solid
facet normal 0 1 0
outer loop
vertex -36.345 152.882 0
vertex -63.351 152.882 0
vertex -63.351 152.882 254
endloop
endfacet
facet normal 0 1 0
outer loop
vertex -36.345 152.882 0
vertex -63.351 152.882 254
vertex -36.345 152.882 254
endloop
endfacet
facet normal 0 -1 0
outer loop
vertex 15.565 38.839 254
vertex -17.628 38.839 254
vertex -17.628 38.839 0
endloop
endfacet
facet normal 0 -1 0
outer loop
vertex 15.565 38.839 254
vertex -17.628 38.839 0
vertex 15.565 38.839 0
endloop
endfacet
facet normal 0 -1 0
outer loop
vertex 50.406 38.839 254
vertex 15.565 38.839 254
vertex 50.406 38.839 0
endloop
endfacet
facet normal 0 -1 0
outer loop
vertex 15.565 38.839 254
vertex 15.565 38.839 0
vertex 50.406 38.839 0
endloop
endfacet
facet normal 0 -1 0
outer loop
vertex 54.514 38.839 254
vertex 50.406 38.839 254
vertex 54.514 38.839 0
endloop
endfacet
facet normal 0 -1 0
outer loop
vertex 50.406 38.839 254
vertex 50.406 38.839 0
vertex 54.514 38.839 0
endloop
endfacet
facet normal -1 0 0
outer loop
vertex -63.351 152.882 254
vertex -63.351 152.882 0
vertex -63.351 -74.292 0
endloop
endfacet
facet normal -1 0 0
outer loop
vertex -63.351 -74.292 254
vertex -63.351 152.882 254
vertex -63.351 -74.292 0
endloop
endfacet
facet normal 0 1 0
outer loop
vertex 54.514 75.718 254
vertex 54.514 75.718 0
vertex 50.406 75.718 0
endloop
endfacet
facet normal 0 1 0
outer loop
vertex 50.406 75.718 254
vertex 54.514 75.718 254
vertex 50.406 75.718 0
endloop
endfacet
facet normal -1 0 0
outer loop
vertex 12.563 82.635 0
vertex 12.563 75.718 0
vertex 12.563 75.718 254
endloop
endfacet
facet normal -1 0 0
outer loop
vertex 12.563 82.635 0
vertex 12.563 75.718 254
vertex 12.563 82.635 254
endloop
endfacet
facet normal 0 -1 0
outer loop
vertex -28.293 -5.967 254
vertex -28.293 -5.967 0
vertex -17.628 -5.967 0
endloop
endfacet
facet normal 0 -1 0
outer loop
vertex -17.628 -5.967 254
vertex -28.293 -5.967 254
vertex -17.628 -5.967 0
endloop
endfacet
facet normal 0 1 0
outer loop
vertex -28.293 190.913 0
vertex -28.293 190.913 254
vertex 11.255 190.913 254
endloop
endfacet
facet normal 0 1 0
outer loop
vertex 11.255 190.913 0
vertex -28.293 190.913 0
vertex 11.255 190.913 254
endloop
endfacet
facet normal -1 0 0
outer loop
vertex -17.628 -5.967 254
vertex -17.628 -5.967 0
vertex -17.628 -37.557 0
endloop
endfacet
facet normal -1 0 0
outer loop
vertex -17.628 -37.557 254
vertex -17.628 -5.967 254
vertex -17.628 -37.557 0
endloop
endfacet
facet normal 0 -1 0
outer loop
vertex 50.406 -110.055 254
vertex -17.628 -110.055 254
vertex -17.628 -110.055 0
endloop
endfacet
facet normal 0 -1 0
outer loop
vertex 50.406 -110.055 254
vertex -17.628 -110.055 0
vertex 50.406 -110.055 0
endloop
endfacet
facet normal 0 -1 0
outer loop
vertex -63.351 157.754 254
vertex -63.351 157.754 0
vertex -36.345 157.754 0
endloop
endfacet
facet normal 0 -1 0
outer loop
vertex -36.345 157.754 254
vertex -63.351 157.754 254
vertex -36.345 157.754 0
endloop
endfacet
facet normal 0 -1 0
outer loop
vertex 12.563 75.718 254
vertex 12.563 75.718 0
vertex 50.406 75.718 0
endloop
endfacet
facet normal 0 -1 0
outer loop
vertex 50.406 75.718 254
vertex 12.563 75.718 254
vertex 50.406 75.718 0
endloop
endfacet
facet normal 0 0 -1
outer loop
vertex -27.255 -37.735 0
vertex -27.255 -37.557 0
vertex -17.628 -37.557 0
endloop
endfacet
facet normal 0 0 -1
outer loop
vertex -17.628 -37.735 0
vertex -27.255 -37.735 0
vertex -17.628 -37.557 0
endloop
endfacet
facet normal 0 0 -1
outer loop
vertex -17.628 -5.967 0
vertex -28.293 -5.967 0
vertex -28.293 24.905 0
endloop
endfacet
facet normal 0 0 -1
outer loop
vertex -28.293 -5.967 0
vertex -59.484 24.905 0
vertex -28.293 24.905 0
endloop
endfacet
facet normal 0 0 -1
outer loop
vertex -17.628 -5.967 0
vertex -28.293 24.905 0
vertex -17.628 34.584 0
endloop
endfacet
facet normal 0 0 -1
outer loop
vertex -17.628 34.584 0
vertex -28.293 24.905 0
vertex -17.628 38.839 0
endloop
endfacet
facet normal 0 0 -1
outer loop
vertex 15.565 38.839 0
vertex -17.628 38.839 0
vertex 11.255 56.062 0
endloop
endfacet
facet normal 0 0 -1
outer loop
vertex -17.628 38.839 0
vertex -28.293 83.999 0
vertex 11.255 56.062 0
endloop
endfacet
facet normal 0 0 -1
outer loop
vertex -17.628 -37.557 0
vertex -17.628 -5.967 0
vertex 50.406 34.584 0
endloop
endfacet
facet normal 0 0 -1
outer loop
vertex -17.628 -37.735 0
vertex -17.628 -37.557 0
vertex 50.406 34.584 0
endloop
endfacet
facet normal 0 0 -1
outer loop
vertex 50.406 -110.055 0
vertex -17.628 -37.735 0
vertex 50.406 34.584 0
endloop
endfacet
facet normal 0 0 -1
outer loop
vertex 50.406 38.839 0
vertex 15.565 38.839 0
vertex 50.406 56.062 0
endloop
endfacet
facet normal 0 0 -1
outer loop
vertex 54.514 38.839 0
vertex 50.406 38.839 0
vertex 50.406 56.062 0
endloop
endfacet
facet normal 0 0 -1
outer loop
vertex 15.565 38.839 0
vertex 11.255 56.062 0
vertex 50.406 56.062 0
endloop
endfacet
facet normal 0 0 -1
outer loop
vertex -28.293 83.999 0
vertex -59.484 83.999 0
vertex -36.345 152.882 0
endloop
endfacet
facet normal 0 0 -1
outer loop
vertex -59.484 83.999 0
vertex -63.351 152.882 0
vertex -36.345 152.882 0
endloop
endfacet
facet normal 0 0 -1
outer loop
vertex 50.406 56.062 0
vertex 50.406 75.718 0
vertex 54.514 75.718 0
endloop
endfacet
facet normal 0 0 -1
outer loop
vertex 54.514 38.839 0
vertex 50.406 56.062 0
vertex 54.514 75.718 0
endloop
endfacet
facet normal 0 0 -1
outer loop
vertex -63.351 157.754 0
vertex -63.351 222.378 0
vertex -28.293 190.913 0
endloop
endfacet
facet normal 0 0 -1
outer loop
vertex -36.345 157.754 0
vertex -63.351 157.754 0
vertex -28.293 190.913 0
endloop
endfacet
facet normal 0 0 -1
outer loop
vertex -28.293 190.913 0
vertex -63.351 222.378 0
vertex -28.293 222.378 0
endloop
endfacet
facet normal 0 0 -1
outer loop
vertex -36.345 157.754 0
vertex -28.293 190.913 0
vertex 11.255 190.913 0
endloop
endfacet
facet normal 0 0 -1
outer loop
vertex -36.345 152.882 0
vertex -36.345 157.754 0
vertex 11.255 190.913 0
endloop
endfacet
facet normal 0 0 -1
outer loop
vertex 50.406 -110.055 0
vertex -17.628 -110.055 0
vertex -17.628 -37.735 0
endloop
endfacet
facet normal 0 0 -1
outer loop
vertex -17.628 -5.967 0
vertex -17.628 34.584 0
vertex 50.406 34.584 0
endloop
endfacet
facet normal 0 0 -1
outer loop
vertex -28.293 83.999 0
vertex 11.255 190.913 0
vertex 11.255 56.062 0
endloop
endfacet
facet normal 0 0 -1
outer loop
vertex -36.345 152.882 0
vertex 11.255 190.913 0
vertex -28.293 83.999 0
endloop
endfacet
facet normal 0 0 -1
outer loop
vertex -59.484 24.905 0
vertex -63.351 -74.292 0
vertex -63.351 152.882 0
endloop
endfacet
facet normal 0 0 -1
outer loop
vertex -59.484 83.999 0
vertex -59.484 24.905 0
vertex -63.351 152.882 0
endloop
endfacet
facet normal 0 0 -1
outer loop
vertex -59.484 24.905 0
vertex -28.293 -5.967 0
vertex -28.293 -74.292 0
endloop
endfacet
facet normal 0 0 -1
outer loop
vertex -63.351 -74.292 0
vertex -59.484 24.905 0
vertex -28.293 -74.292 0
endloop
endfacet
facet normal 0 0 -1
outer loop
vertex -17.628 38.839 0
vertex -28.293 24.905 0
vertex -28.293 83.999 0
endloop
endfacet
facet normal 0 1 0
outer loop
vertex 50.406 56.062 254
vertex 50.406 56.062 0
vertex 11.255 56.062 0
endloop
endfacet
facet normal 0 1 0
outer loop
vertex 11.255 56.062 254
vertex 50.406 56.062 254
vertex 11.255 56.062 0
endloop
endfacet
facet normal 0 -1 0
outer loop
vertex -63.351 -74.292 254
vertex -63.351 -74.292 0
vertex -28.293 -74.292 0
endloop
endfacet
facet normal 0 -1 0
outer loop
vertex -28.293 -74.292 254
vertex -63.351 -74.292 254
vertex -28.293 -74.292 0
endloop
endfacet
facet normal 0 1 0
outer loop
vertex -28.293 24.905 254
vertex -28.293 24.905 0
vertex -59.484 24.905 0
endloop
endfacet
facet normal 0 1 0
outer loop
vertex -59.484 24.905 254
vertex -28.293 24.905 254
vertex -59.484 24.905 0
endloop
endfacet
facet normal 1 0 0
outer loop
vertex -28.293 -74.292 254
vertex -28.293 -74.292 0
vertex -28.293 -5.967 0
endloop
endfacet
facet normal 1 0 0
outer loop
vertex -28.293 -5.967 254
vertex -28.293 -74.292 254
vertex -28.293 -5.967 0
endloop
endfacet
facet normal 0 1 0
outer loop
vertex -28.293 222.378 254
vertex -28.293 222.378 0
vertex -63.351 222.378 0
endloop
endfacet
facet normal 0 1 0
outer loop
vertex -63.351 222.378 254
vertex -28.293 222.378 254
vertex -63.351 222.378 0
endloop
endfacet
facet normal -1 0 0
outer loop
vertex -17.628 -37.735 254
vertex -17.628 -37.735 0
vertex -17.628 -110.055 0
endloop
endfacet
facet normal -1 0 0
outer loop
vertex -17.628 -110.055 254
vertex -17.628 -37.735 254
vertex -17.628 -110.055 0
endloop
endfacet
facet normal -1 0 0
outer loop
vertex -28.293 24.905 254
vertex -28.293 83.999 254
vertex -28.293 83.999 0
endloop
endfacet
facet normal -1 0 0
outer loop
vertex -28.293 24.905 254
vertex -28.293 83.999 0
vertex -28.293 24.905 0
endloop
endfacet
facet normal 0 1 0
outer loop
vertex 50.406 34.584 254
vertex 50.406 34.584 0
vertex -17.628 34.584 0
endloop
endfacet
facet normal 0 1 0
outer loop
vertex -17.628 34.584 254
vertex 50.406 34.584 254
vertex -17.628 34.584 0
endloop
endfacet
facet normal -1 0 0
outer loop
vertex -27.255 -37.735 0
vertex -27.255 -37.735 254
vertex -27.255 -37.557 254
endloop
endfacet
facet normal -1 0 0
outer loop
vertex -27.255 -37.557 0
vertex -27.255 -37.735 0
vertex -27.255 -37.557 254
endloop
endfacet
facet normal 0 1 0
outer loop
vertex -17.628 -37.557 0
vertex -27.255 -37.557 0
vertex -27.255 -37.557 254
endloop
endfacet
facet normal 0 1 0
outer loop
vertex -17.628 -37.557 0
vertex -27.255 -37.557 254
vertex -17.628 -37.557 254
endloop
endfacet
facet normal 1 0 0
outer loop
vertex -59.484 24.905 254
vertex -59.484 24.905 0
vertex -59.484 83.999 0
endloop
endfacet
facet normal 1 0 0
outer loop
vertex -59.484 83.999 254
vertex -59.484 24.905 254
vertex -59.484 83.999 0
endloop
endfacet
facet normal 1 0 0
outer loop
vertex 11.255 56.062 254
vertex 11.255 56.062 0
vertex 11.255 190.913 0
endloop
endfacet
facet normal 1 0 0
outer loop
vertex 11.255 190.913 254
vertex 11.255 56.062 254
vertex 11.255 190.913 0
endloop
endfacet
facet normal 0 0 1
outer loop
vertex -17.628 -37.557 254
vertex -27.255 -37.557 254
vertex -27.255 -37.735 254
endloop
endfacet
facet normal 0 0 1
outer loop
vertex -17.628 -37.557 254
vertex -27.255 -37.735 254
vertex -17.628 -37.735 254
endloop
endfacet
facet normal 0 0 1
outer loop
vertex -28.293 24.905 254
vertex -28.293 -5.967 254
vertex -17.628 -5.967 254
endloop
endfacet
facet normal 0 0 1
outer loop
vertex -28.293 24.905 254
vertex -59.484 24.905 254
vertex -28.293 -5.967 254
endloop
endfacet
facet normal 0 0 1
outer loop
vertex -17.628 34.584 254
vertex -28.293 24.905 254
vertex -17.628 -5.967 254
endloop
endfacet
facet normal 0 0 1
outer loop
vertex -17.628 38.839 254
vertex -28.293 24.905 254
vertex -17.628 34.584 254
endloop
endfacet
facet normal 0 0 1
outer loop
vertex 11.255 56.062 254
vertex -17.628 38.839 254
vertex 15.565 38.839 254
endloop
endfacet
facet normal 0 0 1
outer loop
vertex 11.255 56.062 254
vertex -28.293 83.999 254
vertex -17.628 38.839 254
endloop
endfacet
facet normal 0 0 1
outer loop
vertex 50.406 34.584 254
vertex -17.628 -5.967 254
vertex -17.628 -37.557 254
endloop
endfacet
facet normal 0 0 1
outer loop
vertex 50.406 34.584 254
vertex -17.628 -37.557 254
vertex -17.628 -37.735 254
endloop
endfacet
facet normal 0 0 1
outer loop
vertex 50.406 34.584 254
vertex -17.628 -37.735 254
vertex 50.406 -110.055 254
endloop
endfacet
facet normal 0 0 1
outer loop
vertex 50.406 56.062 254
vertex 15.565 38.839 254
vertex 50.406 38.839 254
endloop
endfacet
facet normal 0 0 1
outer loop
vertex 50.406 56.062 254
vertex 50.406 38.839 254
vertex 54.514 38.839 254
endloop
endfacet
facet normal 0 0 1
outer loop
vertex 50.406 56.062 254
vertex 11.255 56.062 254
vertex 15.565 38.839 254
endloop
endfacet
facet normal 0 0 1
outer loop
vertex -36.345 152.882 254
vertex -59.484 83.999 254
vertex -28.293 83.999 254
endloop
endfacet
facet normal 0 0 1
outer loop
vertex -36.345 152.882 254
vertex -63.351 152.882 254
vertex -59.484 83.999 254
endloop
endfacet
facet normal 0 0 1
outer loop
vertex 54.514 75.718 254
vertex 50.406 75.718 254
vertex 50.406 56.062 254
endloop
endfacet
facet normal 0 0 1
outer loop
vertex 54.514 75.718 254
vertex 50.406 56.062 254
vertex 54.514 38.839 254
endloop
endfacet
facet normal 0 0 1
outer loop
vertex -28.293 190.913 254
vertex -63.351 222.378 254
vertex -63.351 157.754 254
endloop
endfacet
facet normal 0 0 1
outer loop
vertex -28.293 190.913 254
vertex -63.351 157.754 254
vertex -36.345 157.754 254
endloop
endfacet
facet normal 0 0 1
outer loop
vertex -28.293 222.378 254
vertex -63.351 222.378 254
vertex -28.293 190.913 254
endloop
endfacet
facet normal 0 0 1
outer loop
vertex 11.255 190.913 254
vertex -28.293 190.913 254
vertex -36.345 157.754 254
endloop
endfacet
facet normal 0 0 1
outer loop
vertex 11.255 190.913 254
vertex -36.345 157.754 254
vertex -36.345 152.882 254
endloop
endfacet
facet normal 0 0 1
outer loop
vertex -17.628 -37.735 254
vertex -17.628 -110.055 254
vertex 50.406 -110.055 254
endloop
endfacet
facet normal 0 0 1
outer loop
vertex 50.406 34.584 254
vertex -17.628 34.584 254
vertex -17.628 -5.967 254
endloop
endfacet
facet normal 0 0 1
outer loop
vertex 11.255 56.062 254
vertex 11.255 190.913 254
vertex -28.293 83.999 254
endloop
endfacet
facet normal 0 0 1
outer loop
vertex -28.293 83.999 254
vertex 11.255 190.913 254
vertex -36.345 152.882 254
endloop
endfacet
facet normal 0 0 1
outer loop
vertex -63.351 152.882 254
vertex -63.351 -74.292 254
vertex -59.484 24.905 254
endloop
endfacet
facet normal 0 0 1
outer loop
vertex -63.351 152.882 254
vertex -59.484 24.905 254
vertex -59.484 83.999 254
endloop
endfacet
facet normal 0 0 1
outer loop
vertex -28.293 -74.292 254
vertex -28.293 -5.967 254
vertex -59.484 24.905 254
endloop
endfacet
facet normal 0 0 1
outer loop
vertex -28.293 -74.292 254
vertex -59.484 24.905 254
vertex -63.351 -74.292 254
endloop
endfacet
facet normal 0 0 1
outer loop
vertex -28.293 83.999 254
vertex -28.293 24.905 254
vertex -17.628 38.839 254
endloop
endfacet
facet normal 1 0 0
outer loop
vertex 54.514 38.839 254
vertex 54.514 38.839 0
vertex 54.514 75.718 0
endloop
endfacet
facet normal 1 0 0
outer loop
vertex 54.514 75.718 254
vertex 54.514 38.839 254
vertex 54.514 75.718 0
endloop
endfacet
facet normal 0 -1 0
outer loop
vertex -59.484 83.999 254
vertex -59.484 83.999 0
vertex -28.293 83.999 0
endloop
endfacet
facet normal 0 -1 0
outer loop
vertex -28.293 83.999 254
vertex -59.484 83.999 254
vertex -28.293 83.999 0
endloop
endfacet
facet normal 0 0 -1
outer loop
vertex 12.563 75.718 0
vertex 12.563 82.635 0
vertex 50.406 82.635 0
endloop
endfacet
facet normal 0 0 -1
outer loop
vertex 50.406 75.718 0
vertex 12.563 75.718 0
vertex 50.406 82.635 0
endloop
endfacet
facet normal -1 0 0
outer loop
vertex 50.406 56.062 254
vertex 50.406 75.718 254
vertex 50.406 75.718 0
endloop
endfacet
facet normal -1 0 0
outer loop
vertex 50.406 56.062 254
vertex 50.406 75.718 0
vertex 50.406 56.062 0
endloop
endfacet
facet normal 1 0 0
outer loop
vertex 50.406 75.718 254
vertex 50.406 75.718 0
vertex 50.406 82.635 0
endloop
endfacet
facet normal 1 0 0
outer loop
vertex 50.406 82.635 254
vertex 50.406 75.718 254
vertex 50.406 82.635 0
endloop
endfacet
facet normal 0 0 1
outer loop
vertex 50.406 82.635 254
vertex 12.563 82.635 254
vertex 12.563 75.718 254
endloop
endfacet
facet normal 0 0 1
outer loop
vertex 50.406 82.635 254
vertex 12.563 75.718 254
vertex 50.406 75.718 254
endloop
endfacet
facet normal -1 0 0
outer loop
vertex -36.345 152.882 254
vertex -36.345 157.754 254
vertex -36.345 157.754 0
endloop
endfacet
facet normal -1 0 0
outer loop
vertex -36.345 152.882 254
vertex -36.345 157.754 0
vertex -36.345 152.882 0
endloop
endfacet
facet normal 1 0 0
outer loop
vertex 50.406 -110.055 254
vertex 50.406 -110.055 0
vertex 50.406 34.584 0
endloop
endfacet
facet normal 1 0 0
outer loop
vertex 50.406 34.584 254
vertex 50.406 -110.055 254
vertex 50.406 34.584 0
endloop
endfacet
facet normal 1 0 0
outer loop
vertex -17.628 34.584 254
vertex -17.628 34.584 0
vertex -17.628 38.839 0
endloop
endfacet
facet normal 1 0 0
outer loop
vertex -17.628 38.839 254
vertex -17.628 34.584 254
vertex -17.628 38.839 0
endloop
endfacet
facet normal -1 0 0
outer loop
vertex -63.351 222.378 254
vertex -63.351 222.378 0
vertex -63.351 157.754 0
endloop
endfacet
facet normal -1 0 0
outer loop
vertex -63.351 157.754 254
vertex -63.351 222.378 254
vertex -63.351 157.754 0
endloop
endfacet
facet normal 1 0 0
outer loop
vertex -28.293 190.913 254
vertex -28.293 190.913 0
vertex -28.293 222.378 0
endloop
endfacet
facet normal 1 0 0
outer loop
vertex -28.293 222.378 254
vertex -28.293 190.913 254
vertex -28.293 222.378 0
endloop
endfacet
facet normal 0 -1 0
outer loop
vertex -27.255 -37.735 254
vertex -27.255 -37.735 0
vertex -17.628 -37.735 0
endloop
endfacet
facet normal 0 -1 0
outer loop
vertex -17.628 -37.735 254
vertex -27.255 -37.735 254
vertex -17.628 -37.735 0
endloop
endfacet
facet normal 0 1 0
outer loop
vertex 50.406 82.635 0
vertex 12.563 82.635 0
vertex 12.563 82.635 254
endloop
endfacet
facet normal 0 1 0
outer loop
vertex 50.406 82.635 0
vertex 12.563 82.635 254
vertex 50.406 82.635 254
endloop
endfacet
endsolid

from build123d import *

# Parameters (mm, degrees)
F0_W     = 37.8432916477
F0_H     = 6.9169774652
F1_DEPTH = 254
F0_W_2   = 4.0263263509
F0_H_2   = 33.1595093012
F0_W_3   = 39.5476641133
F0_H_3   = 73.7544074655
F0_W_4   = 27.0056165755
F0_H_4   = 32.0053882897
F0_W_5   = 10.6641799212
F0_H_5   = 17.223265022
F0_W_6   = 34.8409274593
F0_W_7   = 3.8670822978
F0_H_6   = 1.6715824604
F0_H_7   = 30.8720460162
F0_W_8   = 0.7546879351
F0_H_8   = 30.3376843221
F0_W_9   = 9.626282379
F0_H_9   = 0.178348273


with BuildPart() as f1:
    # F0 (on Top) → F1 (new body)
    with BuildSketch(Plane.XY):
        with Locations((31.484158244, 79.1766680777)):
            Rectangle(F0_W, F0_H)
    extrude(amount=F1_DEPTH)


with BuildPart() as f1b:
    # F0 (on Top) → F1, piece 2 (new body)
    with BuildSketch(Plane.XY):
        Polygon((-28.2925348729, 222.3779112101), (-63.3508041501, 222.3779112101), (-63.3508041501, 190.9130513668), (-32.3188612238, 190.9130513668), (-28.2925348729, 190.9130513668), align=None)
        Polygon((-32.3188612238, 190.9130513668), (-63.3508041501, 190.9130513668), (-63.3508041501, 157.7535420656), (-36.3451875746, 157.7535420656), (-32.3188612238, 157.7535420656), align=None)
        with Locations((-30.3056980483, 174.3332967162)):
            Rectangle(F0_W_2, F0_H_2)
        with Locations((-8.5187028162, 174.3332967162)):
            Rectangle(F0_W_3, F0_H_2)
        Polygon((-28.2925348729, 83.9991346002), (-28.2925348729, 157.7535420656), (-32.3188612238, 157.7535420656), (-36.3451875746, 157.7535420656), (-36.3451875746, 152.8817266226), (-36.3451875746, 120.8763383329), (-36.3451875746, 83.9991346002), (-35.1700671017, 83.9991346002), (-30.1514100283, 83.9991346002), align=None)
        with Locations((-8.5187028162, 120.8763383329)):
            Rectangle(F0_W_3, F0_H_3)
        Polygon((11.2551292405, 83.9991346002), (-28.2925348729, 83.9991346002), (-28.2925348729, 82.3275521398), (-28.2925348729, 56.0619570315), (-17.6283549517, 56.0619570315), (11.2551292405, 56.0619570315), align=None)
        with Locations((-49.8479958624, 136.8790324777)):
            Rectangle(F0_W_4, F0_H_4)
        Polygon((-36.3451875746, 83.9991346002), (-36.3451875746, 120.8763383329), (-63.3508041501, 120.8763383329), (-63.3508041501, 83.9991346002), (-59.4837218523, 83.9991346002), align=None)
        Polygon((15.5648766086, 56.0619570315), (11.2551292405, 56.0619570315), (-17.6283549517, 56.0619570315), (-17.6283549517, 38.8386920094), (15.5648766086, 38.8386920094), align=None)
        with Locations((-22.9604449123, 47.4503245205)):
            Rectangle(F0_W_5, F0_H_5)
        with Locations((32.9853403382, 47.4503245205)):
            Rectangle(F0_W_6, F0_H_5)
        Polygon((-17.6283549517, 38.8386920094), (-28.2925348729, 38.8386920094), (-28.2925348729, 24.9053705484), (-17.6283549517, 24.9053705484), (-17.6283549517, 34.5843657851), align=None)
        with Locations((-61.4172630012, 83.16334337)):
            Rectangle(F0_W_7, F0_H_6)
        Polygon((50.4058040679, 75.7181793451), (50.4058040679, 56.0619570315), (50.4058040679, 38.8386920094), (54.5139685273, 38.8386920094), (54.5139685273, 75.7181793451), align=None)
        Polygon((-59.4837218523, 56.0619570315), (-59.4837218523, 82.3275521398), (-63.3508041501, 82.3275521398), (-63.3508041501, -74.2918476462), (-28.2925348729, -74.2918476462), (-28.2925348729, -37.5569090247), (-29.047222808, -37.5569090247), (-29.047222808, -7.2192247026), (-28.2925348729, -7.2192247026), (-28.2925348729, -5.9666754678), (-28.2925348729, 24.9053705484), (-48.5863350332, 24.9053705484), (-59.4837218523, 24.9053705484), align=None)
        with Locations((-22.9604449123, 9.4693475403)):
            Rectangle(F0_W_5, F0_H_7)
        Polygon((50.4058040679, 34.5843657851), (-17.6283549517, 34.5843657851), (-17.6283549517, 24.9053705484), (-17.6283549517, -5.9666754678), (-17.6283549517, -37.5569090247), (-17.6283549517, -37.7352572978), (-17.6283549517, -110.0548803806), (50.4058040679, -110.0548803806), align=None)
        with Locations((-28.6698788404, -22.3880668636)):
            Rectangle(F0_W_8, F0_H_8)
        with Locations((-22.4414961413, -37.6460831612)):
            Rectangle(F0_W_9, F0_H_9)
    extrude(amount=F1_DEPTH)


solid = Compound([f1.part, f1b.part])
